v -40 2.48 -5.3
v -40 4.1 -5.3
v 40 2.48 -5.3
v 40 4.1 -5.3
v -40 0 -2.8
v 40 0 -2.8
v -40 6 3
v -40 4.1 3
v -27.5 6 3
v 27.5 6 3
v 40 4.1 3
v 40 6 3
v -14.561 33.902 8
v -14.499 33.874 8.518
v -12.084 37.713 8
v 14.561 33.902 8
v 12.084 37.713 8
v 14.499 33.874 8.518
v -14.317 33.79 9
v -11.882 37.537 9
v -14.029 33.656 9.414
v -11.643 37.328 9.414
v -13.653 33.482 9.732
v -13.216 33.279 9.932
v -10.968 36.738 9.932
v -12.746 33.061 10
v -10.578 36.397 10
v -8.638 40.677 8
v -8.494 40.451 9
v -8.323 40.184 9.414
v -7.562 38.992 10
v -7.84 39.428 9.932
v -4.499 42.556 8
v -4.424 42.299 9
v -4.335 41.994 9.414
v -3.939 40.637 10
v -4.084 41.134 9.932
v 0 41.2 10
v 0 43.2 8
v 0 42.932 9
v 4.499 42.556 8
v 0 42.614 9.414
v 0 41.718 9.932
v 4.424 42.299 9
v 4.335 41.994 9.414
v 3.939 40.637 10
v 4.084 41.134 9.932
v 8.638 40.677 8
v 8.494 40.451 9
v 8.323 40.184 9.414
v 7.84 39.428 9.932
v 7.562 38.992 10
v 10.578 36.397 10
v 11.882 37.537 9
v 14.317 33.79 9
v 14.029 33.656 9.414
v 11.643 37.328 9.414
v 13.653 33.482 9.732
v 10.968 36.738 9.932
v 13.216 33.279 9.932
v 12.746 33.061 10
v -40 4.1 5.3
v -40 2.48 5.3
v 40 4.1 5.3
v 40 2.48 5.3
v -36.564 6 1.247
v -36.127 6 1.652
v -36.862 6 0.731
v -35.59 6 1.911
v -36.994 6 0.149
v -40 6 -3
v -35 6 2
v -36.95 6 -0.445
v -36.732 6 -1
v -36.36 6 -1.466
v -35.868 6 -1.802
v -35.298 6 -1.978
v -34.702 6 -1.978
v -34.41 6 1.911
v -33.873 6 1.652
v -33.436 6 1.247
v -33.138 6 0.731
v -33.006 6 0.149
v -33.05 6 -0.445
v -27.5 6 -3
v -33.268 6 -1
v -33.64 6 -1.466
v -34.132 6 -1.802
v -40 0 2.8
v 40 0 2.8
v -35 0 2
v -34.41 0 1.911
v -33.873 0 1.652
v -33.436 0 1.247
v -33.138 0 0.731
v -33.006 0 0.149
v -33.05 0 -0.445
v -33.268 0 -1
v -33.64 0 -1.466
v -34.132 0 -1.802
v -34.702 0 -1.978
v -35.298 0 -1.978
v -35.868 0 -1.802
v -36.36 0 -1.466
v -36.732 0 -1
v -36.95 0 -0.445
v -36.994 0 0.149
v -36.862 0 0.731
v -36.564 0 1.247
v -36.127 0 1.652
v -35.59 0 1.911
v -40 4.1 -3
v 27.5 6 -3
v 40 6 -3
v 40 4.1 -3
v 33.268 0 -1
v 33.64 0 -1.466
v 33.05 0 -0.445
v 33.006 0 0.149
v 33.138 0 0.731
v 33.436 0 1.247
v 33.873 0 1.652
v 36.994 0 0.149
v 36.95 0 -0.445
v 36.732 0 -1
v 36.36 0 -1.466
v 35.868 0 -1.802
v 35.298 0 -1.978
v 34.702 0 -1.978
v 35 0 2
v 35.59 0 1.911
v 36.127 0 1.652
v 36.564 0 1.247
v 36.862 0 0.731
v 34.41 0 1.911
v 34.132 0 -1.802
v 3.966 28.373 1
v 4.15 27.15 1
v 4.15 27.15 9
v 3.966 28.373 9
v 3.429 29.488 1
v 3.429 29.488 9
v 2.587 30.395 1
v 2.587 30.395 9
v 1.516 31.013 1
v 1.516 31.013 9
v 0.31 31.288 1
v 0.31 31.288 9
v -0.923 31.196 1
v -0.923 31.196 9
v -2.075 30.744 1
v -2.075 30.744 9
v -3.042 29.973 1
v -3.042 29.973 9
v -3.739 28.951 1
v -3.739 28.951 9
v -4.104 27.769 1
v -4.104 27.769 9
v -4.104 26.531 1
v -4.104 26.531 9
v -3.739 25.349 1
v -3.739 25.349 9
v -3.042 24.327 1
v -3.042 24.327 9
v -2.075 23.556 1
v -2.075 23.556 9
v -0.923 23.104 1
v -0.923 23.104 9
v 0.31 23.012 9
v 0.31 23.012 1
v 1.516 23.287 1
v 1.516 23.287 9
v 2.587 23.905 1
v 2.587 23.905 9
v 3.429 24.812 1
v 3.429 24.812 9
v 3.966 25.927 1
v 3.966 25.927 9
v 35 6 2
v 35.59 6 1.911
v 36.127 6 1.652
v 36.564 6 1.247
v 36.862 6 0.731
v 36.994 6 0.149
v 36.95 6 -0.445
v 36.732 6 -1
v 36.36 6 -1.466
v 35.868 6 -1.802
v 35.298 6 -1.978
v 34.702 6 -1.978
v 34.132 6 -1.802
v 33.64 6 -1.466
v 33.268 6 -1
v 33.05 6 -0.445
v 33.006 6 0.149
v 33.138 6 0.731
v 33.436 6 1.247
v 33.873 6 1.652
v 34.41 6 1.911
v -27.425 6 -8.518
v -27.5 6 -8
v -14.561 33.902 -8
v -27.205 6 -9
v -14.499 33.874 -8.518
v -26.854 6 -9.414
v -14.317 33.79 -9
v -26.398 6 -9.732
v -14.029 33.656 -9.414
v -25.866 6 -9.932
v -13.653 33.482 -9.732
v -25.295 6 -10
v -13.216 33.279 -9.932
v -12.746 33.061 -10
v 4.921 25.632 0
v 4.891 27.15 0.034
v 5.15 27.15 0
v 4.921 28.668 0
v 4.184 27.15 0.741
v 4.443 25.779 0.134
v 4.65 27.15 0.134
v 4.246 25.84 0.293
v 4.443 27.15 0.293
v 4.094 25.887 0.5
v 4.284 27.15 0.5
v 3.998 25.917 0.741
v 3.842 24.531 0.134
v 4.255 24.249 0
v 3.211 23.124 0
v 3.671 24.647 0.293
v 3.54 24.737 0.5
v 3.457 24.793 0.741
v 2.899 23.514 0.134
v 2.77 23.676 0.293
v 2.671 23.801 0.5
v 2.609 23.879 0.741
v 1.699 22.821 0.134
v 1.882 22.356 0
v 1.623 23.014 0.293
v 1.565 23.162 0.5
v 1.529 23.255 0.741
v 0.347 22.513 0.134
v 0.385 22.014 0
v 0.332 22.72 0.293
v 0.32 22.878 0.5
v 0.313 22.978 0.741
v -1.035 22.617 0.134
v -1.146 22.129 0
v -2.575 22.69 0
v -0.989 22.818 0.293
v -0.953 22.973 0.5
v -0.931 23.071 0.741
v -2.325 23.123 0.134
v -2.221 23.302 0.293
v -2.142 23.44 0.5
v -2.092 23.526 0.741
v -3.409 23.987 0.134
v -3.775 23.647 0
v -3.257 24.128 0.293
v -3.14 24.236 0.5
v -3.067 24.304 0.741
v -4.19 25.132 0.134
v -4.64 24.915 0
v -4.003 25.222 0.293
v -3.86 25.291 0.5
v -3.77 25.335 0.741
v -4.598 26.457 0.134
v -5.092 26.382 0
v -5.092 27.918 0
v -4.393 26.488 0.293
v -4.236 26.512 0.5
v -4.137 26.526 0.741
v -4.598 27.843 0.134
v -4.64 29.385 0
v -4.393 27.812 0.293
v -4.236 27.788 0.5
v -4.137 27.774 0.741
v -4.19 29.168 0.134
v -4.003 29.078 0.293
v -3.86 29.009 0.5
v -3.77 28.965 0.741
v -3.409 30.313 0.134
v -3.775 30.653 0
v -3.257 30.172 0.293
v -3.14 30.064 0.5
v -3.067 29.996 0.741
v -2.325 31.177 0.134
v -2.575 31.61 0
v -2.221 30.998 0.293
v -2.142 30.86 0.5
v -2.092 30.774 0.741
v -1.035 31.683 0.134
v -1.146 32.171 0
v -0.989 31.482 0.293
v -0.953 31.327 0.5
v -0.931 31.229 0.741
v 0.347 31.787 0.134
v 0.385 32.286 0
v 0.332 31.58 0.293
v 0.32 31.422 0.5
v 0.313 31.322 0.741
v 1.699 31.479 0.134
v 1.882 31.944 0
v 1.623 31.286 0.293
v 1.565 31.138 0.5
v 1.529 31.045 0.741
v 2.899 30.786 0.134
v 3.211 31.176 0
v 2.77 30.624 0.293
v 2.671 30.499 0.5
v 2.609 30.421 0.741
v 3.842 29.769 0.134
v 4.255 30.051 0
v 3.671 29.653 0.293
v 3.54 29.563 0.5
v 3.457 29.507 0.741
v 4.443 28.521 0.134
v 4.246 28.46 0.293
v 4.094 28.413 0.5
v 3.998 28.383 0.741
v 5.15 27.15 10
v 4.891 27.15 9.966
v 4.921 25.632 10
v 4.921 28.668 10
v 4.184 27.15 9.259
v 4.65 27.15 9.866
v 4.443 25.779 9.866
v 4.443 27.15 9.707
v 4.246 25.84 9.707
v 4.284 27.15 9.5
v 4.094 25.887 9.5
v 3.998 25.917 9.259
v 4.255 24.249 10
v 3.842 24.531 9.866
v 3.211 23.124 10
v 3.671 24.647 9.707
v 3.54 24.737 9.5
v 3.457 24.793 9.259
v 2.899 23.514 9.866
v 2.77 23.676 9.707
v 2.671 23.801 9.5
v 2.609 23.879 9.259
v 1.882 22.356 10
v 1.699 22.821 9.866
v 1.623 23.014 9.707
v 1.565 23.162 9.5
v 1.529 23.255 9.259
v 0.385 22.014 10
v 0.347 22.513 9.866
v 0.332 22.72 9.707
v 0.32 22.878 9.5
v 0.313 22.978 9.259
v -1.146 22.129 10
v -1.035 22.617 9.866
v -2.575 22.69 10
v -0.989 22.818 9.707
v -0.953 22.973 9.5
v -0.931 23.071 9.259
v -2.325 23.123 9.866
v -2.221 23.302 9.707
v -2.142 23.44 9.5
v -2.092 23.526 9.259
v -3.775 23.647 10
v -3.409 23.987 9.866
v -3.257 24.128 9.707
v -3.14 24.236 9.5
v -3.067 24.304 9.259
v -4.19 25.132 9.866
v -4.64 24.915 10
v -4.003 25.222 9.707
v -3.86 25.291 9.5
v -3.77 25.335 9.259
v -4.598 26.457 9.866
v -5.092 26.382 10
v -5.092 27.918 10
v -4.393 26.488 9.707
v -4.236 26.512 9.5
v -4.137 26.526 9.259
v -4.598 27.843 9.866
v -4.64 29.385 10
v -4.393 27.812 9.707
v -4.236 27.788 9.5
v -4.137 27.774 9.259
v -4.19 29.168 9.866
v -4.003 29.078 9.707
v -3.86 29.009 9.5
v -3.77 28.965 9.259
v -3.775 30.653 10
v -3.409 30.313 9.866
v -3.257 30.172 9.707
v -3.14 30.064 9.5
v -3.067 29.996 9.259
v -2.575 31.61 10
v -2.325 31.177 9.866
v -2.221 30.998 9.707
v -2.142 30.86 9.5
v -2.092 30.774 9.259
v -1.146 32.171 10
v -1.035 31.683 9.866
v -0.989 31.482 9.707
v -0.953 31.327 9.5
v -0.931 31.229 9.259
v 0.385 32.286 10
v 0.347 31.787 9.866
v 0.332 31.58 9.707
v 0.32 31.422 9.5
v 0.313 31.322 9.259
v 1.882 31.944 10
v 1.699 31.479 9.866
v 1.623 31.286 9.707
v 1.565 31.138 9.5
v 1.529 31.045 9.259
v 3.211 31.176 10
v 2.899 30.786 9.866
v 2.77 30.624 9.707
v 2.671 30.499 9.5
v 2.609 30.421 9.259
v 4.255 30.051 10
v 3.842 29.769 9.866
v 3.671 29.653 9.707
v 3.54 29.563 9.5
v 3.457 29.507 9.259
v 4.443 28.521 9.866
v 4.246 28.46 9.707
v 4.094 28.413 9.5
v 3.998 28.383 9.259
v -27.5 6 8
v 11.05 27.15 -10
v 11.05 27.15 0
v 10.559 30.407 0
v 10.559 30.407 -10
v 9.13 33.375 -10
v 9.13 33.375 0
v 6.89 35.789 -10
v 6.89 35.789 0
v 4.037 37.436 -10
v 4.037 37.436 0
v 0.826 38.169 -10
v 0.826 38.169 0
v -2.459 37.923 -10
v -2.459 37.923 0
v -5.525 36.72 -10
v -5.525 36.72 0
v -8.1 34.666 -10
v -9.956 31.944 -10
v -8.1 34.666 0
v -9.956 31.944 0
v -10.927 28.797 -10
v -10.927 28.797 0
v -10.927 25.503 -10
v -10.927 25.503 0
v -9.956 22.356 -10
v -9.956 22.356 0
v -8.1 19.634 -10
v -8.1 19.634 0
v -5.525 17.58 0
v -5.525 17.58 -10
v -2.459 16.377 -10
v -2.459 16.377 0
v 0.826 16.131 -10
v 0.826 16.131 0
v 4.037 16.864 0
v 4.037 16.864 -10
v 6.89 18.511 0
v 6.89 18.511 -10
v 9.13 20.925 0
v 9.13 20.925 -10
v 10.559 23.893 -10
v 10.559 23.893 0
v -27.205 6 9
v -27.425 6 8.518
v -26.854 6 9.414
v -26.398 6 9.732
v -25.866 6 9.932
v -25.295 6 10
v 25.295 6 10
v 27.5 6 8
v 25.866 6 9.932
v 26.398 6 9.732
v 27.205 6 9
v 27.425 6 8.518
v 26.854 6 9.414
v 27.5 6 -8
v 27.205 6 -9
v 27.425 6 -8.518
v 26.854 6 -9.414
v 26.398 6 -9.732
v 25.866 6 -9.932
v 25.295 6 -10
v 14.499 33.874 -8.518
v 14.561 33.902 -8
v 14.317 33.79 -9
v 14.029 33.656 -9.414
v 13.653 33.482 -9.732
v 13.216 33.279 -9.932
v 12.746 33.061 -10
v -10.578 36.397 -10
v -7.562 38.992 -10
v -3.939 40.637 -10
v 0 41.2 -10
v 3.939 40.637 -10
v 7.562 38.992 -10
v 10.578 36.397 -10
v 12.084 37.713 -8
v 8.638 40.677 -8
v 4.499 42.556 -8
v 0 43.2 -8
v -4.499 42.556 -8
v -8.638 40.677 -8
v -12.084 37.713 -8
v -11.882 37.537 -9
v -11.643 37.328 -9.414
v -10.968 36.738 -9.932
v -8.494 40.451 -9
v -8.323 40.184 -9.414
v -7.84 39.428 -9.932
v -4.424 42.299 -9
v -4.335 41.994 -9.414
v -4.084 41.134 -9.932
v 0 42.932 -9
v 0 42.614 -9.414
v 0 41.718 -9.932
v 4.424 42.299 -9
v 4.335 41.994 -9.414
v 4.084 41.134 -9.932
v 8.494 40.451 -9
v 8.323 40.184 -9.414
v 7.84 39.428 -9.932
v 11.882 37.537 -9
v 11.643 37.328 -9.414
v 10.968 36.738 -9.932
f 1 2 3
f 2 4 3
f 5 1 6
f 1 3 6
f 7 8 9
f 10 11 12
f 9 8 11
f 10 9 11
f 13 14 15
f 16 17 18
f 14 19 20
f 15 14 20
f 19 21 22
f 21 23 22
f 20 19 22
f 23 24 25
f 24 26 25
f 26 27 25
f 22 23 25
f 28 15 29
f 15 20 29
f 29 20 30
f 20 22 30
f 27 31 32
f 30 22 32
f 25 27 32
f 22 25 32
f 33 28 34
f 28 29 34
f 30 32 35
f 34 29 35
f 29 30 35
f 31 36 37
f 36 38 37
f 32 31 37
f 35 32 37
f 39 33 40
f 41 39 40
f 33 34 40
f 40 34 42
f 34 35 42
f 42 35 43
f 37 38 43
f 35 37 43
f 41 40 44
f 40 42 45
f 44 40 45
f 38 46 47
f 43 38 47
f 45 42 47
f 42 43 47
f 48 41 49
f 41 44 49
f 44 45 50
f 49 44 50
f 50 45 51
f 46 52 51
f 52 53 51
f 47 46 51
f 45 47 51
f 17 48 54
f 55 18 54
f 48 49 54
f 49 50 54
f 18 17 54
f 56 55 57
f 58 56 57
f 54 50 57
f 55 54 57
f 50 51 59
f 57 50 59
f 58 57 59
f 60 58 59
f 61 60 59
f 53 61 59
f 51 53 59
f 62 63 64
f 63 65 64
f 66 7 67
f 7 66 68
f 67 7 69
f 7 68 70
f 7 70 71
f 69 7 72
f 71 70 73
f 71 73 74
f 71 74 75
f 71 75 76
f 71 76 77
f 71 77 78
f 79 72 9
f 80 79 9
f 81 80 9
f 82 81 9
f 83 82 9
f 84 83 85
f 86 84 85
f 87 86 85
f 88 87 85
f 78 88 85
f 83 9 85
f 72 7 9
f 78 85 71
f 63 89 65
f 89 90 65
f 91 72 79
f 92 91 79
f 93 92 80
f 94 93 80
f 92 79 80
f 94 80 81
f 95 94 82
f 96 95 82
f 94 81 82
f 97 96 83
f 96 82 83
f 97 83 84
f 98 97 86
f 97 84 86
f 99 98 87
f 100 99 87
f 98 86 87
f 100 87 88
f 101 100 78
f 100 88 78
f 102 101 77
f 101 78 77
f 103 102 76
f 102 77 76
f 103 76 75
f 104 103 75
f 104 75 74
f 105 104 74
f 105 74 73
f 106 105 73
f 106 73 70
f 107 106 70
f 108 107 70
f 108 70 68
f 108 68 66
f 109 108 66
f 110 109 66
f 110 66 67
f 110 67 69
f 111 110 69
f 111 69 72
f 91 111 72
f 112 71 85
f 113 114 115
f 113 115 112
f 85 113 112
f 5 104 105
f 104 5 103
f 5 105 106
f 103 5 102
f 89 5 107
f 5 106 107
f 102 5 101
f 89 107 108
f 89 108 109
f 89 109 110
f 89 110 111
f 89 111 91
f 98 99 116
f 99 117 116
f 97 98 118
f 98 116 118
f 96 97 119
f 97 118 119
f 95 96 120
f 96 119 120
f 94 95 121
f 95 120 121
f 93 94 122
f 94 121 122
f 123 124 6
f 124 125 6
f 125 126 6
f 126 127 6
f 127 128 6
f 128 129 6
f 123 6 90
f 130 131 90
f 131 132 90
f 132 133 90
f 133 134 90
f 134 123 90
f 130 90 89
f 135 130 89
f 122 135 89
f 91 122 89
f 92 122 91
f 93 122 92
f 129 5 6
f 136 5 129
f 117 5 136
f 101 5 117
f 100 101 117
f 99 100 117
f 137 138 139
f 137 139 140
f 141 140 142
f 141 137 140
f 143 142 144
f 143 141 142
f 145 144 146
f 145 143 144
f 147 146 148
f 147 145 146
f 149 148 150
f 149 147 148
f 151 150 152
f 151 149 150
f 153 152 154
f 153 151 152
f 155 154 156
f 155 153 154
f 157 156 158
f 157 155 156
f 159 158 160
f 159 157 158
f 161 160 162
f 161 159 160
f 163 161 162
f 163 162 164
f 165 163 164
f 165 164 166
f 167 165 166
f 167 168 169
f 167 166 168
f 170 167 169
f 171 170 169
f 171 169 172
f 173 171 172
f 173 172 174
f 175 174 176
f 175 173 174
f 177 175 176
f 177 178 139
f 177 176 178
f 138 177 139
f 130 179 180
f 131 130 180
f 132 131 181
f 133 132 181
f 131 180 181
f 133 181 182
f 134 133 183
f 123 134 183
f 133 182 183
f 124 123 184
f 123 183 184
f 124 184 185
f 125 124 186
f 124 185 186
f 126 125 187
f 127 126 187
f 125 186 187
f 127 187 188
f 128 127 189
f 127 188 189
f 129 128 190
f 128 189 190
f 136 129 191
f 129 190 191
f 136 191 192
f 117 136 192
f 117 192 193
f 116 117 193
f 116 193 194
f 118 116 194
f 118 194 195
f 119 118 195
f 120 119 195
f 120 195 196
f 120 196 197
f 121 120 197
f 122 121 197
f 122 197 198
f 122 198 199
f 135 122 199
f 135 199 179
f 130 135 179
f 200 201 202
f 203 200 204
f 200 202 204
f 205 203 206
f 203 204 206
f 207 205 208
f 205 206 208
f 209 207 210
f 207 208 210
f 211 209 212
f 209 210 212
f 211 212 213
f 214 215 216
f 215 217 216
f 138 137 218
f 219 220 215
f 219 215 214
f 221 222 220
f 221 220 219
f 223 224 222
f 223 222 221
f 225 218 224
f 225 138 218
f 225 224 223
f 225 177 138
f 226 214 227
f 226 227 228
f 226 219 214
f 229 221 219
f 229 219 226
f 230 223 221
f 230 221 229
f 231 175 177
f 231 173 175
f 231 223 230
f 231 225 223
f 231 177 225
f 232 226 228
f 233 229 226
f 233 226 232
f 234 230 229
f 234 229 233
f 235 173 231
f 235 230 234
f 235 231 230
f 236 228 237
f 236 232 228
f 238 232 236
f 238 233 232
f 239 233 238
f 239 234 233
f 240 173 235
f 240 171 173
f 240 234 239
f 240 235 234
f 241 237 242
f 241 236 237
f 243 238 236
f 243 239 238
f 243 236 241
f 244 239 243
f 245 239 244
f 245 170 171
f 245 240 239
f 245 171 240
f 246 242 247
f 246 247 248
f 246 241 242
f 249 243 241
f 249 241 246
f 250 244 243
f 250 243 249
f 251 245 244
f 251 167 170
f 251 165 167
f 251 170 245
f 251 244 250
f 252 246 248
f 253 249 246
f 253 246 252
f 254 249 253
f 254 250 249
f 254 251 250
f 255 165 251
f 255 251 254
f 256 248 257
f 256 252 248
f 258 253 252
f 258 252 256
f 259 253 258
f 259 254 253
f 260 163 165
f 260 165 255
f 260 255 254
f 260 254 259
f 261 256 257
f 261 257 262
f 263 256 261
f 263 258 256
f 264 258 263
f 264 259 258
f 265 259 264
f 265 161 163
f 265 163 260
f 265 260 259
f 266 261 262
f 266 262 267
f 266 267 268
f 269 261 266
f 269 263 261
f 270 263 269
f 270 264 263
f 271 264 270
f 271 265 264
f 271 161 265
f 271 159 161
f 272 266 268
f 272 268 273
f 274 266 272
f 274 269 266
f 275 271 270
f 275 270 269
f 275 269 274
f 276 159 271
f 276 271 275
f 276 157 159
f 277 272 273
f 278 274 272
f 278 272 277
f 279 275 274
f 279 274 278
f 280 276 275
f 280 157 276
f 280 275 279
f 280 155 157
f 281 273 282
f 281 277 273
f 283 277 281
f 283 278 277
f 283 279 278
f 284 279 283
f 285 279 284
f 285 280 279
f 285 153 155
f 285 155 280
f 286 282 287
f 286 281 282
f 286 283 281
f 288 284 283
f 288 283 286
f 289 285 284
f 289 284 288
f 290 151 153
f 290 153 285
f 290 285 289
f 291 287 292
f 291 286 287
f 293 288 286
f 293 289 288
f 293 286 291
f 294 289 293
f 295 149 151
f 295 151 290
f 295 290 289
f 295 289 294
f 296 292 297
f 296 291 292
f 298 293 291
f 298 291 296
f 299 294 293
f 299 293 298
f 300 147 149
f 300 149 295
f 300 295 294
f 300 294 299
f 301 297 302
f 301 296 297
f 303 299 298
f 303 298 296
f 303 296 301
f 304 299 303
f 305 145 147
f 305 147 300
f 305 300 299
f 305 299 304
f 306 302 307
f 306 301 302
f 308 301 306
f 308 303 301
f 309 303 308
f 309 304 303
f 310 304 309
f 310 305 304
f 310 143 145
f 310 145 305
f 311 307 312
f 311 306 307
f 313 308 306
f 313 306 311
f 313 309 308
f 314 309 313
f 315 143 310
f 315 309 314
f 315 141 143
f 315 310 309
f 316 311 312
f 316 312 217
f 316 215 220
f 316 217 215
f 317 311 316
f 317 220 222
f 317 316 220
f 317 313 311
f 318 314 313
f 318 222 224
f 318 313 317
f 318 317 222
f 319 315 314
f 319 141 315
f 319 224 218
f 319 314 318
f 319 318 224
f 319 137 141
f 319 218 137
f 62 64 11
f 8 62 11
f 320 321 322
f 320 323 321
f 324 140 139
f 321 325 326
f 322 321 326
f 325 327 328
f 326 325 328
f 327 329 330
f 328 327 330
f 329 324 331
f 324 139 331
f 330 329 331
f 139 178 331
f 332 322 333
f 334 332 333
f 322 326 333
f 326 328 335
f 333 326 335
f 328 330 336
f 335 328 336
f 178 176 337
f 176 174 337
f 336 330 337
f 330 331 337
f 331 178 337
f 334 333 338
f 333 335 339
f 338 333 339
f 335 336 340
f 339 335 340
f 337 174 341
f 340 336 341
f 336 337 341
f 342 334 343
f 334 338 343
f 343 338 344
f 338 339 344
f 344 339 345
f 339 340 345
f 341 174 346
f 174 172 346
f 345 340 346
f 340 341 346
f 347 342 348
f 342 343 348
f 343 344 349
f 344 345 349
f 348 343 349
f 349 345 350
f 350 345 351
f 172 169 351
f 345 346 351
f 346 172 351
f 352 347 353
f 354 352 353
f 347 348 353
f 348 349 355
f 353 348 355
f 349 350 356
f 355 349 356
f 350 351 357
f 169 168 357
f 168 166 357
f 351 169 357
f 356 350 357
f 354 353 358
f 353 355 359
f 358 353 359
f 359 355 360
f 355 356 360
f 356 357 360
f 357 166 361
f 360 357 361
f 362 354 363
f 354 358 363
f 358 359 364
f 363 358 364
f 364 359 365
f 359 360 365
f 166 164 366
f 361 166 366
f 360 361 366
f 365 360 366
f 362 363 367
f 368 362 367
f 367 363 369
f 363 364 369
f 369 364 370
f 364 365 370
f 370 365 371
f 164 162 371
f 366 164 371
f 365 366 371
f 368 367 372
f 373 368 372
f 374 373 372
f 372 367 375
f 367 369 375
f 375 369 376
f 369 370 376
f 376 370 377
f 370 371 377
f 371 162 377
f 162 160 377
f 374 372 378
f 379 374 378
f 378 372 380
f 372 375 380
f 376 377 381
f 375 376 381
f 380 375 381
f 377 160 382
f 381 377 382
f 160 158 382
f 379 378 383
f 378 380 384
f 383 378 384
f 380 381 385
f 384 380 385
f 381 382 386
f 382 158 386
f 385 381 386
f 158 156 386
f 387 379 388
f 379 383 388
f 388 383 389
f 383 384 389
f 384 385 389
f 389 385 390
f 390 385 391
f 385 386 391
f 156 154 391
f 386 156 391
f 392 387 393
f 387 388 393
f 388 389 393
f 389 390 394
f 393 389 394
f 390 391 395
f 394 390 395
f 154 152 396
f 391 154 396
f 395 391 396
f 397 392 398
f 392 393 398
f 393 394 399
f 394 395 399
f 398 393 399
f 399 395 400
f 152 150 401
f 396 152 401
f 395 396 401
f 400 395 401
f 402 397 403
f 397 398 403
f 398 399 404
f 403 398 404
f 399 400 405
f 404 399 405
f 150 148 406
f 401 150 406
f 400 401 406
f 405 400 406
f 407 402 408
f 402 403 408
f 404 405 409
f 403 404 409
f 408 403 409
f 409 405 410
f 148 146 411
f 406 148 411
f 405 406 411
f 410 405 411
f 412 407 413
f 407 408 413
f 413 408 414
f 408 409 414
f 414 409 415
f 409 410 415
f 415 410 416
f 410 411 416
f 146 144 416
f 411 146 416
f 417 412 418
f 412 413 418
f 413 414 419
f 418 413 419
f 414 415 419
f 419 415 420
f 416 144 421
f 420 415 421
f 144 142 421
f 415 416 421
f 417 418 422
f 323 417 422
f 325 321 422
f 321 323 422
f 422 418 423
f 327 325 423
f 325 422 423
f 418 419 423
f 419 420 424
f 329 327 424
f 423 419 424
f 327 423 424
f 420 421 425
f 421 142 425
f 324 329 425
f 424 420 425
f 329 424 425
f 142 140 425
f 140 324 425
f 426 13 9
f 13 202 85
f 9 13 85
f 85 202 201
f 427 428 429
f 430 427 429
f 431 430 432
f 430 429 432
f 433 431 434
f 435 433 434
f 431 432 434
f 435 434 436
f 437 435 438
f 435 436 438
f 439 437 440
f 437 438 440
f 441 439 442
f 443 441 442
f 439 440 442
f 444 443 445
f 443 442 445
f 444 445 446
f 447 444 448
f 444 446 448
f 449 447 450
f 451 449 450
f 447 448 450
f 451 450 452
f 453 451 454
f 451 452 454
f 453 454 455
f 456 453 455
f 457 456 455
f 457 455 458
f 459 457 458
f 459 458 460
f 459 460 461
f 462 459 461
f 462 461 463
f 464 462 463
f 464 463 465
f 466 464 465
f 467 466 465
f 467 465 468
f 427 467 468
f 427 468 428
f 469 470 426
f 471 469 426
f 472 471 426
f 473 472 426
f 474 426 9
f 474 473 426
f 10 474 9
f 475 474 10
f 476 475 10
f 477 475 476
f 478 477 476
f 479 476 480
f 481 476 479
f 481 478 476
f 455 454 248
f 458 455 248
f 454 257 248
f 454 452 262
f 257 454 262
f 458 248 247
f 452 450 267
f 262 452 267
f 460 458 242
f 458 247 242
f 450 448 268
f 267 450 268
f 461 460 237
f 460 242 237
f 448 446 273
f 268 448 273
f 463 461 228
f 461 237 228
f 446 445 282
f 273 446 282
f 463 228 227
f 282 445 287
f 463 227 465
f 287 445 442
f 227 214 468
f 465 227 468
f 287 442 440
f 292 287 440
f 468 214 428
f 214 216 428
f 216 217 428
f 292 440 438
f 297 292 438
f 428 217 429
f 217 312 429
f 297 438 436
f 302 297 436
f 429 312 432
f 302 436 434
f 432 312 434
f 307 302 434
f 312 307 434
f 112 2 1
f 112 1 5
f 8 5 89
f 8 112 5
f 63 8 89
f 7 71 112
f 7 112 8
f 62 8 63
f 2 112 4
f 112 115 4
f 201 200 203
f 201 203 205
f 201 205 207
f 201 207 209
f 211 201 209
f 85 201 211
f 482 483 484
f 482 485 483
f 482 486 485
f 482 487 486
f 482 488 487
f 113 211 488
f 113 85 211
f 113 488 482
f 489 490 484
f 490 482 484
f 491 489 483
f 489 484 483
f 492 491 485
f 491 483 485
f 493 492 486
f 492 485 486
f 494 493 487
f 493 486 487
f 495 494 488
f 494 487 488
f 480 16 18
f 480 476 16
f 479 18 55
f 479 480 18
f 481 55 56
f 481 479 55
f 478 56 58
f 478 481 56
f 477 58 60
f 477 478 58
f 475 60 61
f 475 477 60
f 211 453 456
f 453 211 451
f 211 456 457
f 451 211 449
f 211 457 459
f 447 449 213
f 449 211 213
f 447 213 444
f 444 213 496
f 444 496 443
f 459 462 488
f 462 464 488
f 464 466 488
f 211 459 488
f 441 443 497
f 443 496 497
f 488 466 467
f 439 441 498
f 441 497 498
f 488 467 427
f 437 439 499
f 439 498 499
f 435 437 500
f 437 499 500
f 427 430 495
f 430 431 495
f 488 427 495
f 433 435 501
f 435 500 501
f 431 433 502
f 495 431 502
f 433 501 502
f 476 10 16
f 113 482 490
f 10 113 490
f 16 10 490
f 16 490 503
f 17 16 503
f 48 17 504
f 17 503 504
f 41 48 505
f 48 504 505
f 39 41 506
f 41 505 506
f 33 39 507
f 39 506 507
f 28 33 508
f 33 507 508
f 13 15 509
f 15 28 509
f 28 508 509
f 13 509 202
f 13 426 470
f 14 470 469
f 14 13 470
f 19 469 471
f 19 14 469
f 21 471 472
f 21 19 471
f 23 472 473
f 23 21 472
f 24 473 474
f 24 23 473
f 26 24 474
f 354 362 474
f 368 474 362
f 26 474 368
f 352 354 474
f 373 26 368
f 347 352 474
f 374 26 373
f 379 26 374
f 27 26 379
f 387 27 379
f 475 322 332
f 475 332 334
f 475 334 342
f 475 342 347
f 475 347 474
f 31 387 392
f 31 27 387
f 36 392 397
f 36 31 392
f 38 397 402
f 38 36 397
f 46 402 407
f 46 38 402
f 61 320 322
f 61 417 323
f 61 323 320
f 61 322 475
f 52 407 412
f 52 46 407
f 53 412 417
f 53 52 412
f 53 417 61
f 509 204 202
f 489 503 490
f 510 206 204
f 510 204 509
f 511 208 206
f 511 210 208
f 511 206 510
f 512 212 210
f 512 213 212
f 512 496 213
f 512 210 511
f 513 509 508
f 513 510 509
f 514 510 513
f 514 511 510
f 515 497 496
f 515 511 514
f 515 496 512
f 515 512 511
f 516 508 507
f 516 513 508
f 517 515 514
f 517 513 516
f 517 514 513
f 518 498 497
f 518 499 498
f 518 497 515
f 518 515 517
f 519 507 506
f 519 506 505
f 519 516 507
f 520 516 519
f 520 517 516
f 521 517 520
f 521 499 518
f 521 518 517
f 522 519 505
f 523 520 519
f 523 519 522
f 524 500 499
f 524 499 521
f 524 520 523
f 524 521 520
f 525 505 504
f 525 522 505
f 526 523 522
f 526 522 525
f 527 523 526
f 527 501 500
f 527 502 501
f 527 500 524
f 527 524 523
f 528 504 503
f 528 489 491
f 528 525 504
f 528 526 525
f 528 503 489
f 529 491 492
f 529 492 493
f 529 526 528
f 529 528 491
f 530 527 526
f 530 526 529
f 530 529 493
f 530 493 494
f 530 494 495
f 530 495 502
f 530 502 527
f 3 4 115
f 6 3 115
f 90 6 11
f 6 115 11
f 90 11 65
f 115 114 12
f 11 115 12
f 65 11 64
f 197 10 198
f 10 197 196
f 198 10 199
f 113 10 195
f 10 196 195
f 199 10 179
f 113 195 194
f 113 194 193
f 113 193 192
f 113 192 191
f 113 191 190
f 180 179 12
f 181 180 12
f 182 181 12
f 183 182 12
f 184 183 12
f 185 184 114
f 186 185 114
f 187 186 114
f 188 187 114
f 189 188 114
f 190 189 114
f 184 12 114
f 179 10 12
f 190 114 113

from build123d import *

# Parameters (mm, degrees)
BOSS_EXTRUDE1_DEPTH     = 40
SKETCH2_W               = 55
SKETCH2_H               = 44
BOSS_EXTRUDE2_DEPTH     = 10
CUT_EXTRUDE2_DEPTH      = 65.807406984
CUT_EXTRUDE2_DEPTH_BACK = 65.807406984
SKETCH3_R               = 4.15
CUT_EXTRUDE3_DEPTH      = 65.807406984
CUT_EXTRUDE3_DEPTH_BACK = 65.807406984
SKETCH6_R               = 11.05
CUT_EXTRUDE4_DEPTH      = 60.718003985
FILLET1_R               = 2
FILLET2_R               = 1
SKETCH8_R               = 2
CUT_EXTRUDE5_DEPTH      = 56.532332924


with BuildPart() as part:
    # Sketch1 → Boss-Extrude1 (new, symmetric)
    with BuildSketch(Plane(origin=(0, 0, 0), x_dir=(0, 0, -1), z_dir=(1, 0, 0))):
        Polygon((-3, 6), (3, 6), (3, 4.1), (5.3, 4.1), (5.3, 2.48), (2.8, 0), (-2.8, 0), (-5.3, 2.48), (-5.3, 4.1), (-3, 4.1), align=None)
    extrude(amount=BOSS_EXTRUDE1_DEPTH, both=True)

    # Sketch2 → Boss-Extrude2 (add, symmetric)
    with BuildSketch(Plane.XY):
        with Locations((0, 28)):
            Rectangle(SKETCH2_W, SKETCH2_H)
    extrude(amount=BOSS_EXTRUDE2_DEPTH, both=True)

    # Sketch3 → Cut-Extrude2 (cut, two sides: drawn at the far end of the back side and taken through both)
    with BuildSketch(Plane.XY.offset(-CUT_EXTRUDE2_DEPTH_BACK)):
        with Locations((0, 27.15)):
            Circle(SKETCH3_R)
    extrude(amount=CUT_EXTRUDE2_DEPTH + CUT_EXTRUDE2_DEPTH_BACK, mode=Mode.SUBTRACT)

    # Sketch7 → Cut-Extrude3 (cut, two sides: drawn at the far end of the back side and taken through both)
    with BuildSketch(Plane.XY.offset(-CUT_EXTRUDE3_DEPTH_BACK)):
        with BuildLine():
            Line((27.5, 6), (14.560515369, 33.902324948))
            ThreePointArc((14.560515369, 33.902324948), (0, 43.2), (-14.560515369, 33.902324948))
            Line((-14.560515369, 33.902324948), (-27.5, 6))
            Line((-27.5, 6), (-40, 6))
            Line((-40, 6), (-40, 58.297822633))
            Line((-40, 58.297822633), (40, 58.297822633))
            Line((40, 58.297822633), (40, 6))
            Line((40, 6), (27.5, 6))
        make_face()
    extrude(amount=CUT_EXTRUDE3_DEPTH + CUT_EXTRUDE3_DEPTH_BACK, mode=Mode.SUBTRACT)

    # Sketch6 → Cut-Extrude4 (cut, through all)
    with BuildSketch(Plane.XY):
        with Locations((0, 27.15)):
            Circle(SKETCH6_R)
    extrude(amount=-CUT_EXTRUDE4_DEPTH, mode=Mode.SUBTRACT)

    # Fillet1
    fillet1_edges = [part.edges().sort_by_distance(p)[0] for p in [
        (21.030257684, 19.951162474, 10),
        (-21.030257684, 19.951162474, 10),
        (0, 43.2, 10),
        (21.030257684, 19.951162474, -10),
        (0, 43.2, -10),
        (-21.030257684, 19.951162474, -10),
    ]]
    fillet(fillet1_edges, radius=FILLET1_R)

    # Fillet2
    fillet2_edges = [part.edges().sort_by_distance(p)[0] for p in [
        (-4.15, 27.15, 10),
        (-4.15, 27.15, 0),
    ]]
    fillet(fillet2_edges, radius=FILLET2_R)

    # Sketch8 → Cut-Extrude5 (cut, through all)
    with BuildSketch(Plane(origin=(0, 6, 0), x_dir=(1, 0, 0), z_dir=(0, 1, 0))):
        with Locations(Location((35, 0, 0), (0, 0, 270))):
            Circle(SKETCH8_R)
        with Locations(Location((-35, 0, 0), (0, 0, 270))):
            Circle(SKETCH8_R)
    extrude(amount=-CUT_EXTRUDE5_DEPTH, mode=Mode.SUBTRACT)


solid = part.part
